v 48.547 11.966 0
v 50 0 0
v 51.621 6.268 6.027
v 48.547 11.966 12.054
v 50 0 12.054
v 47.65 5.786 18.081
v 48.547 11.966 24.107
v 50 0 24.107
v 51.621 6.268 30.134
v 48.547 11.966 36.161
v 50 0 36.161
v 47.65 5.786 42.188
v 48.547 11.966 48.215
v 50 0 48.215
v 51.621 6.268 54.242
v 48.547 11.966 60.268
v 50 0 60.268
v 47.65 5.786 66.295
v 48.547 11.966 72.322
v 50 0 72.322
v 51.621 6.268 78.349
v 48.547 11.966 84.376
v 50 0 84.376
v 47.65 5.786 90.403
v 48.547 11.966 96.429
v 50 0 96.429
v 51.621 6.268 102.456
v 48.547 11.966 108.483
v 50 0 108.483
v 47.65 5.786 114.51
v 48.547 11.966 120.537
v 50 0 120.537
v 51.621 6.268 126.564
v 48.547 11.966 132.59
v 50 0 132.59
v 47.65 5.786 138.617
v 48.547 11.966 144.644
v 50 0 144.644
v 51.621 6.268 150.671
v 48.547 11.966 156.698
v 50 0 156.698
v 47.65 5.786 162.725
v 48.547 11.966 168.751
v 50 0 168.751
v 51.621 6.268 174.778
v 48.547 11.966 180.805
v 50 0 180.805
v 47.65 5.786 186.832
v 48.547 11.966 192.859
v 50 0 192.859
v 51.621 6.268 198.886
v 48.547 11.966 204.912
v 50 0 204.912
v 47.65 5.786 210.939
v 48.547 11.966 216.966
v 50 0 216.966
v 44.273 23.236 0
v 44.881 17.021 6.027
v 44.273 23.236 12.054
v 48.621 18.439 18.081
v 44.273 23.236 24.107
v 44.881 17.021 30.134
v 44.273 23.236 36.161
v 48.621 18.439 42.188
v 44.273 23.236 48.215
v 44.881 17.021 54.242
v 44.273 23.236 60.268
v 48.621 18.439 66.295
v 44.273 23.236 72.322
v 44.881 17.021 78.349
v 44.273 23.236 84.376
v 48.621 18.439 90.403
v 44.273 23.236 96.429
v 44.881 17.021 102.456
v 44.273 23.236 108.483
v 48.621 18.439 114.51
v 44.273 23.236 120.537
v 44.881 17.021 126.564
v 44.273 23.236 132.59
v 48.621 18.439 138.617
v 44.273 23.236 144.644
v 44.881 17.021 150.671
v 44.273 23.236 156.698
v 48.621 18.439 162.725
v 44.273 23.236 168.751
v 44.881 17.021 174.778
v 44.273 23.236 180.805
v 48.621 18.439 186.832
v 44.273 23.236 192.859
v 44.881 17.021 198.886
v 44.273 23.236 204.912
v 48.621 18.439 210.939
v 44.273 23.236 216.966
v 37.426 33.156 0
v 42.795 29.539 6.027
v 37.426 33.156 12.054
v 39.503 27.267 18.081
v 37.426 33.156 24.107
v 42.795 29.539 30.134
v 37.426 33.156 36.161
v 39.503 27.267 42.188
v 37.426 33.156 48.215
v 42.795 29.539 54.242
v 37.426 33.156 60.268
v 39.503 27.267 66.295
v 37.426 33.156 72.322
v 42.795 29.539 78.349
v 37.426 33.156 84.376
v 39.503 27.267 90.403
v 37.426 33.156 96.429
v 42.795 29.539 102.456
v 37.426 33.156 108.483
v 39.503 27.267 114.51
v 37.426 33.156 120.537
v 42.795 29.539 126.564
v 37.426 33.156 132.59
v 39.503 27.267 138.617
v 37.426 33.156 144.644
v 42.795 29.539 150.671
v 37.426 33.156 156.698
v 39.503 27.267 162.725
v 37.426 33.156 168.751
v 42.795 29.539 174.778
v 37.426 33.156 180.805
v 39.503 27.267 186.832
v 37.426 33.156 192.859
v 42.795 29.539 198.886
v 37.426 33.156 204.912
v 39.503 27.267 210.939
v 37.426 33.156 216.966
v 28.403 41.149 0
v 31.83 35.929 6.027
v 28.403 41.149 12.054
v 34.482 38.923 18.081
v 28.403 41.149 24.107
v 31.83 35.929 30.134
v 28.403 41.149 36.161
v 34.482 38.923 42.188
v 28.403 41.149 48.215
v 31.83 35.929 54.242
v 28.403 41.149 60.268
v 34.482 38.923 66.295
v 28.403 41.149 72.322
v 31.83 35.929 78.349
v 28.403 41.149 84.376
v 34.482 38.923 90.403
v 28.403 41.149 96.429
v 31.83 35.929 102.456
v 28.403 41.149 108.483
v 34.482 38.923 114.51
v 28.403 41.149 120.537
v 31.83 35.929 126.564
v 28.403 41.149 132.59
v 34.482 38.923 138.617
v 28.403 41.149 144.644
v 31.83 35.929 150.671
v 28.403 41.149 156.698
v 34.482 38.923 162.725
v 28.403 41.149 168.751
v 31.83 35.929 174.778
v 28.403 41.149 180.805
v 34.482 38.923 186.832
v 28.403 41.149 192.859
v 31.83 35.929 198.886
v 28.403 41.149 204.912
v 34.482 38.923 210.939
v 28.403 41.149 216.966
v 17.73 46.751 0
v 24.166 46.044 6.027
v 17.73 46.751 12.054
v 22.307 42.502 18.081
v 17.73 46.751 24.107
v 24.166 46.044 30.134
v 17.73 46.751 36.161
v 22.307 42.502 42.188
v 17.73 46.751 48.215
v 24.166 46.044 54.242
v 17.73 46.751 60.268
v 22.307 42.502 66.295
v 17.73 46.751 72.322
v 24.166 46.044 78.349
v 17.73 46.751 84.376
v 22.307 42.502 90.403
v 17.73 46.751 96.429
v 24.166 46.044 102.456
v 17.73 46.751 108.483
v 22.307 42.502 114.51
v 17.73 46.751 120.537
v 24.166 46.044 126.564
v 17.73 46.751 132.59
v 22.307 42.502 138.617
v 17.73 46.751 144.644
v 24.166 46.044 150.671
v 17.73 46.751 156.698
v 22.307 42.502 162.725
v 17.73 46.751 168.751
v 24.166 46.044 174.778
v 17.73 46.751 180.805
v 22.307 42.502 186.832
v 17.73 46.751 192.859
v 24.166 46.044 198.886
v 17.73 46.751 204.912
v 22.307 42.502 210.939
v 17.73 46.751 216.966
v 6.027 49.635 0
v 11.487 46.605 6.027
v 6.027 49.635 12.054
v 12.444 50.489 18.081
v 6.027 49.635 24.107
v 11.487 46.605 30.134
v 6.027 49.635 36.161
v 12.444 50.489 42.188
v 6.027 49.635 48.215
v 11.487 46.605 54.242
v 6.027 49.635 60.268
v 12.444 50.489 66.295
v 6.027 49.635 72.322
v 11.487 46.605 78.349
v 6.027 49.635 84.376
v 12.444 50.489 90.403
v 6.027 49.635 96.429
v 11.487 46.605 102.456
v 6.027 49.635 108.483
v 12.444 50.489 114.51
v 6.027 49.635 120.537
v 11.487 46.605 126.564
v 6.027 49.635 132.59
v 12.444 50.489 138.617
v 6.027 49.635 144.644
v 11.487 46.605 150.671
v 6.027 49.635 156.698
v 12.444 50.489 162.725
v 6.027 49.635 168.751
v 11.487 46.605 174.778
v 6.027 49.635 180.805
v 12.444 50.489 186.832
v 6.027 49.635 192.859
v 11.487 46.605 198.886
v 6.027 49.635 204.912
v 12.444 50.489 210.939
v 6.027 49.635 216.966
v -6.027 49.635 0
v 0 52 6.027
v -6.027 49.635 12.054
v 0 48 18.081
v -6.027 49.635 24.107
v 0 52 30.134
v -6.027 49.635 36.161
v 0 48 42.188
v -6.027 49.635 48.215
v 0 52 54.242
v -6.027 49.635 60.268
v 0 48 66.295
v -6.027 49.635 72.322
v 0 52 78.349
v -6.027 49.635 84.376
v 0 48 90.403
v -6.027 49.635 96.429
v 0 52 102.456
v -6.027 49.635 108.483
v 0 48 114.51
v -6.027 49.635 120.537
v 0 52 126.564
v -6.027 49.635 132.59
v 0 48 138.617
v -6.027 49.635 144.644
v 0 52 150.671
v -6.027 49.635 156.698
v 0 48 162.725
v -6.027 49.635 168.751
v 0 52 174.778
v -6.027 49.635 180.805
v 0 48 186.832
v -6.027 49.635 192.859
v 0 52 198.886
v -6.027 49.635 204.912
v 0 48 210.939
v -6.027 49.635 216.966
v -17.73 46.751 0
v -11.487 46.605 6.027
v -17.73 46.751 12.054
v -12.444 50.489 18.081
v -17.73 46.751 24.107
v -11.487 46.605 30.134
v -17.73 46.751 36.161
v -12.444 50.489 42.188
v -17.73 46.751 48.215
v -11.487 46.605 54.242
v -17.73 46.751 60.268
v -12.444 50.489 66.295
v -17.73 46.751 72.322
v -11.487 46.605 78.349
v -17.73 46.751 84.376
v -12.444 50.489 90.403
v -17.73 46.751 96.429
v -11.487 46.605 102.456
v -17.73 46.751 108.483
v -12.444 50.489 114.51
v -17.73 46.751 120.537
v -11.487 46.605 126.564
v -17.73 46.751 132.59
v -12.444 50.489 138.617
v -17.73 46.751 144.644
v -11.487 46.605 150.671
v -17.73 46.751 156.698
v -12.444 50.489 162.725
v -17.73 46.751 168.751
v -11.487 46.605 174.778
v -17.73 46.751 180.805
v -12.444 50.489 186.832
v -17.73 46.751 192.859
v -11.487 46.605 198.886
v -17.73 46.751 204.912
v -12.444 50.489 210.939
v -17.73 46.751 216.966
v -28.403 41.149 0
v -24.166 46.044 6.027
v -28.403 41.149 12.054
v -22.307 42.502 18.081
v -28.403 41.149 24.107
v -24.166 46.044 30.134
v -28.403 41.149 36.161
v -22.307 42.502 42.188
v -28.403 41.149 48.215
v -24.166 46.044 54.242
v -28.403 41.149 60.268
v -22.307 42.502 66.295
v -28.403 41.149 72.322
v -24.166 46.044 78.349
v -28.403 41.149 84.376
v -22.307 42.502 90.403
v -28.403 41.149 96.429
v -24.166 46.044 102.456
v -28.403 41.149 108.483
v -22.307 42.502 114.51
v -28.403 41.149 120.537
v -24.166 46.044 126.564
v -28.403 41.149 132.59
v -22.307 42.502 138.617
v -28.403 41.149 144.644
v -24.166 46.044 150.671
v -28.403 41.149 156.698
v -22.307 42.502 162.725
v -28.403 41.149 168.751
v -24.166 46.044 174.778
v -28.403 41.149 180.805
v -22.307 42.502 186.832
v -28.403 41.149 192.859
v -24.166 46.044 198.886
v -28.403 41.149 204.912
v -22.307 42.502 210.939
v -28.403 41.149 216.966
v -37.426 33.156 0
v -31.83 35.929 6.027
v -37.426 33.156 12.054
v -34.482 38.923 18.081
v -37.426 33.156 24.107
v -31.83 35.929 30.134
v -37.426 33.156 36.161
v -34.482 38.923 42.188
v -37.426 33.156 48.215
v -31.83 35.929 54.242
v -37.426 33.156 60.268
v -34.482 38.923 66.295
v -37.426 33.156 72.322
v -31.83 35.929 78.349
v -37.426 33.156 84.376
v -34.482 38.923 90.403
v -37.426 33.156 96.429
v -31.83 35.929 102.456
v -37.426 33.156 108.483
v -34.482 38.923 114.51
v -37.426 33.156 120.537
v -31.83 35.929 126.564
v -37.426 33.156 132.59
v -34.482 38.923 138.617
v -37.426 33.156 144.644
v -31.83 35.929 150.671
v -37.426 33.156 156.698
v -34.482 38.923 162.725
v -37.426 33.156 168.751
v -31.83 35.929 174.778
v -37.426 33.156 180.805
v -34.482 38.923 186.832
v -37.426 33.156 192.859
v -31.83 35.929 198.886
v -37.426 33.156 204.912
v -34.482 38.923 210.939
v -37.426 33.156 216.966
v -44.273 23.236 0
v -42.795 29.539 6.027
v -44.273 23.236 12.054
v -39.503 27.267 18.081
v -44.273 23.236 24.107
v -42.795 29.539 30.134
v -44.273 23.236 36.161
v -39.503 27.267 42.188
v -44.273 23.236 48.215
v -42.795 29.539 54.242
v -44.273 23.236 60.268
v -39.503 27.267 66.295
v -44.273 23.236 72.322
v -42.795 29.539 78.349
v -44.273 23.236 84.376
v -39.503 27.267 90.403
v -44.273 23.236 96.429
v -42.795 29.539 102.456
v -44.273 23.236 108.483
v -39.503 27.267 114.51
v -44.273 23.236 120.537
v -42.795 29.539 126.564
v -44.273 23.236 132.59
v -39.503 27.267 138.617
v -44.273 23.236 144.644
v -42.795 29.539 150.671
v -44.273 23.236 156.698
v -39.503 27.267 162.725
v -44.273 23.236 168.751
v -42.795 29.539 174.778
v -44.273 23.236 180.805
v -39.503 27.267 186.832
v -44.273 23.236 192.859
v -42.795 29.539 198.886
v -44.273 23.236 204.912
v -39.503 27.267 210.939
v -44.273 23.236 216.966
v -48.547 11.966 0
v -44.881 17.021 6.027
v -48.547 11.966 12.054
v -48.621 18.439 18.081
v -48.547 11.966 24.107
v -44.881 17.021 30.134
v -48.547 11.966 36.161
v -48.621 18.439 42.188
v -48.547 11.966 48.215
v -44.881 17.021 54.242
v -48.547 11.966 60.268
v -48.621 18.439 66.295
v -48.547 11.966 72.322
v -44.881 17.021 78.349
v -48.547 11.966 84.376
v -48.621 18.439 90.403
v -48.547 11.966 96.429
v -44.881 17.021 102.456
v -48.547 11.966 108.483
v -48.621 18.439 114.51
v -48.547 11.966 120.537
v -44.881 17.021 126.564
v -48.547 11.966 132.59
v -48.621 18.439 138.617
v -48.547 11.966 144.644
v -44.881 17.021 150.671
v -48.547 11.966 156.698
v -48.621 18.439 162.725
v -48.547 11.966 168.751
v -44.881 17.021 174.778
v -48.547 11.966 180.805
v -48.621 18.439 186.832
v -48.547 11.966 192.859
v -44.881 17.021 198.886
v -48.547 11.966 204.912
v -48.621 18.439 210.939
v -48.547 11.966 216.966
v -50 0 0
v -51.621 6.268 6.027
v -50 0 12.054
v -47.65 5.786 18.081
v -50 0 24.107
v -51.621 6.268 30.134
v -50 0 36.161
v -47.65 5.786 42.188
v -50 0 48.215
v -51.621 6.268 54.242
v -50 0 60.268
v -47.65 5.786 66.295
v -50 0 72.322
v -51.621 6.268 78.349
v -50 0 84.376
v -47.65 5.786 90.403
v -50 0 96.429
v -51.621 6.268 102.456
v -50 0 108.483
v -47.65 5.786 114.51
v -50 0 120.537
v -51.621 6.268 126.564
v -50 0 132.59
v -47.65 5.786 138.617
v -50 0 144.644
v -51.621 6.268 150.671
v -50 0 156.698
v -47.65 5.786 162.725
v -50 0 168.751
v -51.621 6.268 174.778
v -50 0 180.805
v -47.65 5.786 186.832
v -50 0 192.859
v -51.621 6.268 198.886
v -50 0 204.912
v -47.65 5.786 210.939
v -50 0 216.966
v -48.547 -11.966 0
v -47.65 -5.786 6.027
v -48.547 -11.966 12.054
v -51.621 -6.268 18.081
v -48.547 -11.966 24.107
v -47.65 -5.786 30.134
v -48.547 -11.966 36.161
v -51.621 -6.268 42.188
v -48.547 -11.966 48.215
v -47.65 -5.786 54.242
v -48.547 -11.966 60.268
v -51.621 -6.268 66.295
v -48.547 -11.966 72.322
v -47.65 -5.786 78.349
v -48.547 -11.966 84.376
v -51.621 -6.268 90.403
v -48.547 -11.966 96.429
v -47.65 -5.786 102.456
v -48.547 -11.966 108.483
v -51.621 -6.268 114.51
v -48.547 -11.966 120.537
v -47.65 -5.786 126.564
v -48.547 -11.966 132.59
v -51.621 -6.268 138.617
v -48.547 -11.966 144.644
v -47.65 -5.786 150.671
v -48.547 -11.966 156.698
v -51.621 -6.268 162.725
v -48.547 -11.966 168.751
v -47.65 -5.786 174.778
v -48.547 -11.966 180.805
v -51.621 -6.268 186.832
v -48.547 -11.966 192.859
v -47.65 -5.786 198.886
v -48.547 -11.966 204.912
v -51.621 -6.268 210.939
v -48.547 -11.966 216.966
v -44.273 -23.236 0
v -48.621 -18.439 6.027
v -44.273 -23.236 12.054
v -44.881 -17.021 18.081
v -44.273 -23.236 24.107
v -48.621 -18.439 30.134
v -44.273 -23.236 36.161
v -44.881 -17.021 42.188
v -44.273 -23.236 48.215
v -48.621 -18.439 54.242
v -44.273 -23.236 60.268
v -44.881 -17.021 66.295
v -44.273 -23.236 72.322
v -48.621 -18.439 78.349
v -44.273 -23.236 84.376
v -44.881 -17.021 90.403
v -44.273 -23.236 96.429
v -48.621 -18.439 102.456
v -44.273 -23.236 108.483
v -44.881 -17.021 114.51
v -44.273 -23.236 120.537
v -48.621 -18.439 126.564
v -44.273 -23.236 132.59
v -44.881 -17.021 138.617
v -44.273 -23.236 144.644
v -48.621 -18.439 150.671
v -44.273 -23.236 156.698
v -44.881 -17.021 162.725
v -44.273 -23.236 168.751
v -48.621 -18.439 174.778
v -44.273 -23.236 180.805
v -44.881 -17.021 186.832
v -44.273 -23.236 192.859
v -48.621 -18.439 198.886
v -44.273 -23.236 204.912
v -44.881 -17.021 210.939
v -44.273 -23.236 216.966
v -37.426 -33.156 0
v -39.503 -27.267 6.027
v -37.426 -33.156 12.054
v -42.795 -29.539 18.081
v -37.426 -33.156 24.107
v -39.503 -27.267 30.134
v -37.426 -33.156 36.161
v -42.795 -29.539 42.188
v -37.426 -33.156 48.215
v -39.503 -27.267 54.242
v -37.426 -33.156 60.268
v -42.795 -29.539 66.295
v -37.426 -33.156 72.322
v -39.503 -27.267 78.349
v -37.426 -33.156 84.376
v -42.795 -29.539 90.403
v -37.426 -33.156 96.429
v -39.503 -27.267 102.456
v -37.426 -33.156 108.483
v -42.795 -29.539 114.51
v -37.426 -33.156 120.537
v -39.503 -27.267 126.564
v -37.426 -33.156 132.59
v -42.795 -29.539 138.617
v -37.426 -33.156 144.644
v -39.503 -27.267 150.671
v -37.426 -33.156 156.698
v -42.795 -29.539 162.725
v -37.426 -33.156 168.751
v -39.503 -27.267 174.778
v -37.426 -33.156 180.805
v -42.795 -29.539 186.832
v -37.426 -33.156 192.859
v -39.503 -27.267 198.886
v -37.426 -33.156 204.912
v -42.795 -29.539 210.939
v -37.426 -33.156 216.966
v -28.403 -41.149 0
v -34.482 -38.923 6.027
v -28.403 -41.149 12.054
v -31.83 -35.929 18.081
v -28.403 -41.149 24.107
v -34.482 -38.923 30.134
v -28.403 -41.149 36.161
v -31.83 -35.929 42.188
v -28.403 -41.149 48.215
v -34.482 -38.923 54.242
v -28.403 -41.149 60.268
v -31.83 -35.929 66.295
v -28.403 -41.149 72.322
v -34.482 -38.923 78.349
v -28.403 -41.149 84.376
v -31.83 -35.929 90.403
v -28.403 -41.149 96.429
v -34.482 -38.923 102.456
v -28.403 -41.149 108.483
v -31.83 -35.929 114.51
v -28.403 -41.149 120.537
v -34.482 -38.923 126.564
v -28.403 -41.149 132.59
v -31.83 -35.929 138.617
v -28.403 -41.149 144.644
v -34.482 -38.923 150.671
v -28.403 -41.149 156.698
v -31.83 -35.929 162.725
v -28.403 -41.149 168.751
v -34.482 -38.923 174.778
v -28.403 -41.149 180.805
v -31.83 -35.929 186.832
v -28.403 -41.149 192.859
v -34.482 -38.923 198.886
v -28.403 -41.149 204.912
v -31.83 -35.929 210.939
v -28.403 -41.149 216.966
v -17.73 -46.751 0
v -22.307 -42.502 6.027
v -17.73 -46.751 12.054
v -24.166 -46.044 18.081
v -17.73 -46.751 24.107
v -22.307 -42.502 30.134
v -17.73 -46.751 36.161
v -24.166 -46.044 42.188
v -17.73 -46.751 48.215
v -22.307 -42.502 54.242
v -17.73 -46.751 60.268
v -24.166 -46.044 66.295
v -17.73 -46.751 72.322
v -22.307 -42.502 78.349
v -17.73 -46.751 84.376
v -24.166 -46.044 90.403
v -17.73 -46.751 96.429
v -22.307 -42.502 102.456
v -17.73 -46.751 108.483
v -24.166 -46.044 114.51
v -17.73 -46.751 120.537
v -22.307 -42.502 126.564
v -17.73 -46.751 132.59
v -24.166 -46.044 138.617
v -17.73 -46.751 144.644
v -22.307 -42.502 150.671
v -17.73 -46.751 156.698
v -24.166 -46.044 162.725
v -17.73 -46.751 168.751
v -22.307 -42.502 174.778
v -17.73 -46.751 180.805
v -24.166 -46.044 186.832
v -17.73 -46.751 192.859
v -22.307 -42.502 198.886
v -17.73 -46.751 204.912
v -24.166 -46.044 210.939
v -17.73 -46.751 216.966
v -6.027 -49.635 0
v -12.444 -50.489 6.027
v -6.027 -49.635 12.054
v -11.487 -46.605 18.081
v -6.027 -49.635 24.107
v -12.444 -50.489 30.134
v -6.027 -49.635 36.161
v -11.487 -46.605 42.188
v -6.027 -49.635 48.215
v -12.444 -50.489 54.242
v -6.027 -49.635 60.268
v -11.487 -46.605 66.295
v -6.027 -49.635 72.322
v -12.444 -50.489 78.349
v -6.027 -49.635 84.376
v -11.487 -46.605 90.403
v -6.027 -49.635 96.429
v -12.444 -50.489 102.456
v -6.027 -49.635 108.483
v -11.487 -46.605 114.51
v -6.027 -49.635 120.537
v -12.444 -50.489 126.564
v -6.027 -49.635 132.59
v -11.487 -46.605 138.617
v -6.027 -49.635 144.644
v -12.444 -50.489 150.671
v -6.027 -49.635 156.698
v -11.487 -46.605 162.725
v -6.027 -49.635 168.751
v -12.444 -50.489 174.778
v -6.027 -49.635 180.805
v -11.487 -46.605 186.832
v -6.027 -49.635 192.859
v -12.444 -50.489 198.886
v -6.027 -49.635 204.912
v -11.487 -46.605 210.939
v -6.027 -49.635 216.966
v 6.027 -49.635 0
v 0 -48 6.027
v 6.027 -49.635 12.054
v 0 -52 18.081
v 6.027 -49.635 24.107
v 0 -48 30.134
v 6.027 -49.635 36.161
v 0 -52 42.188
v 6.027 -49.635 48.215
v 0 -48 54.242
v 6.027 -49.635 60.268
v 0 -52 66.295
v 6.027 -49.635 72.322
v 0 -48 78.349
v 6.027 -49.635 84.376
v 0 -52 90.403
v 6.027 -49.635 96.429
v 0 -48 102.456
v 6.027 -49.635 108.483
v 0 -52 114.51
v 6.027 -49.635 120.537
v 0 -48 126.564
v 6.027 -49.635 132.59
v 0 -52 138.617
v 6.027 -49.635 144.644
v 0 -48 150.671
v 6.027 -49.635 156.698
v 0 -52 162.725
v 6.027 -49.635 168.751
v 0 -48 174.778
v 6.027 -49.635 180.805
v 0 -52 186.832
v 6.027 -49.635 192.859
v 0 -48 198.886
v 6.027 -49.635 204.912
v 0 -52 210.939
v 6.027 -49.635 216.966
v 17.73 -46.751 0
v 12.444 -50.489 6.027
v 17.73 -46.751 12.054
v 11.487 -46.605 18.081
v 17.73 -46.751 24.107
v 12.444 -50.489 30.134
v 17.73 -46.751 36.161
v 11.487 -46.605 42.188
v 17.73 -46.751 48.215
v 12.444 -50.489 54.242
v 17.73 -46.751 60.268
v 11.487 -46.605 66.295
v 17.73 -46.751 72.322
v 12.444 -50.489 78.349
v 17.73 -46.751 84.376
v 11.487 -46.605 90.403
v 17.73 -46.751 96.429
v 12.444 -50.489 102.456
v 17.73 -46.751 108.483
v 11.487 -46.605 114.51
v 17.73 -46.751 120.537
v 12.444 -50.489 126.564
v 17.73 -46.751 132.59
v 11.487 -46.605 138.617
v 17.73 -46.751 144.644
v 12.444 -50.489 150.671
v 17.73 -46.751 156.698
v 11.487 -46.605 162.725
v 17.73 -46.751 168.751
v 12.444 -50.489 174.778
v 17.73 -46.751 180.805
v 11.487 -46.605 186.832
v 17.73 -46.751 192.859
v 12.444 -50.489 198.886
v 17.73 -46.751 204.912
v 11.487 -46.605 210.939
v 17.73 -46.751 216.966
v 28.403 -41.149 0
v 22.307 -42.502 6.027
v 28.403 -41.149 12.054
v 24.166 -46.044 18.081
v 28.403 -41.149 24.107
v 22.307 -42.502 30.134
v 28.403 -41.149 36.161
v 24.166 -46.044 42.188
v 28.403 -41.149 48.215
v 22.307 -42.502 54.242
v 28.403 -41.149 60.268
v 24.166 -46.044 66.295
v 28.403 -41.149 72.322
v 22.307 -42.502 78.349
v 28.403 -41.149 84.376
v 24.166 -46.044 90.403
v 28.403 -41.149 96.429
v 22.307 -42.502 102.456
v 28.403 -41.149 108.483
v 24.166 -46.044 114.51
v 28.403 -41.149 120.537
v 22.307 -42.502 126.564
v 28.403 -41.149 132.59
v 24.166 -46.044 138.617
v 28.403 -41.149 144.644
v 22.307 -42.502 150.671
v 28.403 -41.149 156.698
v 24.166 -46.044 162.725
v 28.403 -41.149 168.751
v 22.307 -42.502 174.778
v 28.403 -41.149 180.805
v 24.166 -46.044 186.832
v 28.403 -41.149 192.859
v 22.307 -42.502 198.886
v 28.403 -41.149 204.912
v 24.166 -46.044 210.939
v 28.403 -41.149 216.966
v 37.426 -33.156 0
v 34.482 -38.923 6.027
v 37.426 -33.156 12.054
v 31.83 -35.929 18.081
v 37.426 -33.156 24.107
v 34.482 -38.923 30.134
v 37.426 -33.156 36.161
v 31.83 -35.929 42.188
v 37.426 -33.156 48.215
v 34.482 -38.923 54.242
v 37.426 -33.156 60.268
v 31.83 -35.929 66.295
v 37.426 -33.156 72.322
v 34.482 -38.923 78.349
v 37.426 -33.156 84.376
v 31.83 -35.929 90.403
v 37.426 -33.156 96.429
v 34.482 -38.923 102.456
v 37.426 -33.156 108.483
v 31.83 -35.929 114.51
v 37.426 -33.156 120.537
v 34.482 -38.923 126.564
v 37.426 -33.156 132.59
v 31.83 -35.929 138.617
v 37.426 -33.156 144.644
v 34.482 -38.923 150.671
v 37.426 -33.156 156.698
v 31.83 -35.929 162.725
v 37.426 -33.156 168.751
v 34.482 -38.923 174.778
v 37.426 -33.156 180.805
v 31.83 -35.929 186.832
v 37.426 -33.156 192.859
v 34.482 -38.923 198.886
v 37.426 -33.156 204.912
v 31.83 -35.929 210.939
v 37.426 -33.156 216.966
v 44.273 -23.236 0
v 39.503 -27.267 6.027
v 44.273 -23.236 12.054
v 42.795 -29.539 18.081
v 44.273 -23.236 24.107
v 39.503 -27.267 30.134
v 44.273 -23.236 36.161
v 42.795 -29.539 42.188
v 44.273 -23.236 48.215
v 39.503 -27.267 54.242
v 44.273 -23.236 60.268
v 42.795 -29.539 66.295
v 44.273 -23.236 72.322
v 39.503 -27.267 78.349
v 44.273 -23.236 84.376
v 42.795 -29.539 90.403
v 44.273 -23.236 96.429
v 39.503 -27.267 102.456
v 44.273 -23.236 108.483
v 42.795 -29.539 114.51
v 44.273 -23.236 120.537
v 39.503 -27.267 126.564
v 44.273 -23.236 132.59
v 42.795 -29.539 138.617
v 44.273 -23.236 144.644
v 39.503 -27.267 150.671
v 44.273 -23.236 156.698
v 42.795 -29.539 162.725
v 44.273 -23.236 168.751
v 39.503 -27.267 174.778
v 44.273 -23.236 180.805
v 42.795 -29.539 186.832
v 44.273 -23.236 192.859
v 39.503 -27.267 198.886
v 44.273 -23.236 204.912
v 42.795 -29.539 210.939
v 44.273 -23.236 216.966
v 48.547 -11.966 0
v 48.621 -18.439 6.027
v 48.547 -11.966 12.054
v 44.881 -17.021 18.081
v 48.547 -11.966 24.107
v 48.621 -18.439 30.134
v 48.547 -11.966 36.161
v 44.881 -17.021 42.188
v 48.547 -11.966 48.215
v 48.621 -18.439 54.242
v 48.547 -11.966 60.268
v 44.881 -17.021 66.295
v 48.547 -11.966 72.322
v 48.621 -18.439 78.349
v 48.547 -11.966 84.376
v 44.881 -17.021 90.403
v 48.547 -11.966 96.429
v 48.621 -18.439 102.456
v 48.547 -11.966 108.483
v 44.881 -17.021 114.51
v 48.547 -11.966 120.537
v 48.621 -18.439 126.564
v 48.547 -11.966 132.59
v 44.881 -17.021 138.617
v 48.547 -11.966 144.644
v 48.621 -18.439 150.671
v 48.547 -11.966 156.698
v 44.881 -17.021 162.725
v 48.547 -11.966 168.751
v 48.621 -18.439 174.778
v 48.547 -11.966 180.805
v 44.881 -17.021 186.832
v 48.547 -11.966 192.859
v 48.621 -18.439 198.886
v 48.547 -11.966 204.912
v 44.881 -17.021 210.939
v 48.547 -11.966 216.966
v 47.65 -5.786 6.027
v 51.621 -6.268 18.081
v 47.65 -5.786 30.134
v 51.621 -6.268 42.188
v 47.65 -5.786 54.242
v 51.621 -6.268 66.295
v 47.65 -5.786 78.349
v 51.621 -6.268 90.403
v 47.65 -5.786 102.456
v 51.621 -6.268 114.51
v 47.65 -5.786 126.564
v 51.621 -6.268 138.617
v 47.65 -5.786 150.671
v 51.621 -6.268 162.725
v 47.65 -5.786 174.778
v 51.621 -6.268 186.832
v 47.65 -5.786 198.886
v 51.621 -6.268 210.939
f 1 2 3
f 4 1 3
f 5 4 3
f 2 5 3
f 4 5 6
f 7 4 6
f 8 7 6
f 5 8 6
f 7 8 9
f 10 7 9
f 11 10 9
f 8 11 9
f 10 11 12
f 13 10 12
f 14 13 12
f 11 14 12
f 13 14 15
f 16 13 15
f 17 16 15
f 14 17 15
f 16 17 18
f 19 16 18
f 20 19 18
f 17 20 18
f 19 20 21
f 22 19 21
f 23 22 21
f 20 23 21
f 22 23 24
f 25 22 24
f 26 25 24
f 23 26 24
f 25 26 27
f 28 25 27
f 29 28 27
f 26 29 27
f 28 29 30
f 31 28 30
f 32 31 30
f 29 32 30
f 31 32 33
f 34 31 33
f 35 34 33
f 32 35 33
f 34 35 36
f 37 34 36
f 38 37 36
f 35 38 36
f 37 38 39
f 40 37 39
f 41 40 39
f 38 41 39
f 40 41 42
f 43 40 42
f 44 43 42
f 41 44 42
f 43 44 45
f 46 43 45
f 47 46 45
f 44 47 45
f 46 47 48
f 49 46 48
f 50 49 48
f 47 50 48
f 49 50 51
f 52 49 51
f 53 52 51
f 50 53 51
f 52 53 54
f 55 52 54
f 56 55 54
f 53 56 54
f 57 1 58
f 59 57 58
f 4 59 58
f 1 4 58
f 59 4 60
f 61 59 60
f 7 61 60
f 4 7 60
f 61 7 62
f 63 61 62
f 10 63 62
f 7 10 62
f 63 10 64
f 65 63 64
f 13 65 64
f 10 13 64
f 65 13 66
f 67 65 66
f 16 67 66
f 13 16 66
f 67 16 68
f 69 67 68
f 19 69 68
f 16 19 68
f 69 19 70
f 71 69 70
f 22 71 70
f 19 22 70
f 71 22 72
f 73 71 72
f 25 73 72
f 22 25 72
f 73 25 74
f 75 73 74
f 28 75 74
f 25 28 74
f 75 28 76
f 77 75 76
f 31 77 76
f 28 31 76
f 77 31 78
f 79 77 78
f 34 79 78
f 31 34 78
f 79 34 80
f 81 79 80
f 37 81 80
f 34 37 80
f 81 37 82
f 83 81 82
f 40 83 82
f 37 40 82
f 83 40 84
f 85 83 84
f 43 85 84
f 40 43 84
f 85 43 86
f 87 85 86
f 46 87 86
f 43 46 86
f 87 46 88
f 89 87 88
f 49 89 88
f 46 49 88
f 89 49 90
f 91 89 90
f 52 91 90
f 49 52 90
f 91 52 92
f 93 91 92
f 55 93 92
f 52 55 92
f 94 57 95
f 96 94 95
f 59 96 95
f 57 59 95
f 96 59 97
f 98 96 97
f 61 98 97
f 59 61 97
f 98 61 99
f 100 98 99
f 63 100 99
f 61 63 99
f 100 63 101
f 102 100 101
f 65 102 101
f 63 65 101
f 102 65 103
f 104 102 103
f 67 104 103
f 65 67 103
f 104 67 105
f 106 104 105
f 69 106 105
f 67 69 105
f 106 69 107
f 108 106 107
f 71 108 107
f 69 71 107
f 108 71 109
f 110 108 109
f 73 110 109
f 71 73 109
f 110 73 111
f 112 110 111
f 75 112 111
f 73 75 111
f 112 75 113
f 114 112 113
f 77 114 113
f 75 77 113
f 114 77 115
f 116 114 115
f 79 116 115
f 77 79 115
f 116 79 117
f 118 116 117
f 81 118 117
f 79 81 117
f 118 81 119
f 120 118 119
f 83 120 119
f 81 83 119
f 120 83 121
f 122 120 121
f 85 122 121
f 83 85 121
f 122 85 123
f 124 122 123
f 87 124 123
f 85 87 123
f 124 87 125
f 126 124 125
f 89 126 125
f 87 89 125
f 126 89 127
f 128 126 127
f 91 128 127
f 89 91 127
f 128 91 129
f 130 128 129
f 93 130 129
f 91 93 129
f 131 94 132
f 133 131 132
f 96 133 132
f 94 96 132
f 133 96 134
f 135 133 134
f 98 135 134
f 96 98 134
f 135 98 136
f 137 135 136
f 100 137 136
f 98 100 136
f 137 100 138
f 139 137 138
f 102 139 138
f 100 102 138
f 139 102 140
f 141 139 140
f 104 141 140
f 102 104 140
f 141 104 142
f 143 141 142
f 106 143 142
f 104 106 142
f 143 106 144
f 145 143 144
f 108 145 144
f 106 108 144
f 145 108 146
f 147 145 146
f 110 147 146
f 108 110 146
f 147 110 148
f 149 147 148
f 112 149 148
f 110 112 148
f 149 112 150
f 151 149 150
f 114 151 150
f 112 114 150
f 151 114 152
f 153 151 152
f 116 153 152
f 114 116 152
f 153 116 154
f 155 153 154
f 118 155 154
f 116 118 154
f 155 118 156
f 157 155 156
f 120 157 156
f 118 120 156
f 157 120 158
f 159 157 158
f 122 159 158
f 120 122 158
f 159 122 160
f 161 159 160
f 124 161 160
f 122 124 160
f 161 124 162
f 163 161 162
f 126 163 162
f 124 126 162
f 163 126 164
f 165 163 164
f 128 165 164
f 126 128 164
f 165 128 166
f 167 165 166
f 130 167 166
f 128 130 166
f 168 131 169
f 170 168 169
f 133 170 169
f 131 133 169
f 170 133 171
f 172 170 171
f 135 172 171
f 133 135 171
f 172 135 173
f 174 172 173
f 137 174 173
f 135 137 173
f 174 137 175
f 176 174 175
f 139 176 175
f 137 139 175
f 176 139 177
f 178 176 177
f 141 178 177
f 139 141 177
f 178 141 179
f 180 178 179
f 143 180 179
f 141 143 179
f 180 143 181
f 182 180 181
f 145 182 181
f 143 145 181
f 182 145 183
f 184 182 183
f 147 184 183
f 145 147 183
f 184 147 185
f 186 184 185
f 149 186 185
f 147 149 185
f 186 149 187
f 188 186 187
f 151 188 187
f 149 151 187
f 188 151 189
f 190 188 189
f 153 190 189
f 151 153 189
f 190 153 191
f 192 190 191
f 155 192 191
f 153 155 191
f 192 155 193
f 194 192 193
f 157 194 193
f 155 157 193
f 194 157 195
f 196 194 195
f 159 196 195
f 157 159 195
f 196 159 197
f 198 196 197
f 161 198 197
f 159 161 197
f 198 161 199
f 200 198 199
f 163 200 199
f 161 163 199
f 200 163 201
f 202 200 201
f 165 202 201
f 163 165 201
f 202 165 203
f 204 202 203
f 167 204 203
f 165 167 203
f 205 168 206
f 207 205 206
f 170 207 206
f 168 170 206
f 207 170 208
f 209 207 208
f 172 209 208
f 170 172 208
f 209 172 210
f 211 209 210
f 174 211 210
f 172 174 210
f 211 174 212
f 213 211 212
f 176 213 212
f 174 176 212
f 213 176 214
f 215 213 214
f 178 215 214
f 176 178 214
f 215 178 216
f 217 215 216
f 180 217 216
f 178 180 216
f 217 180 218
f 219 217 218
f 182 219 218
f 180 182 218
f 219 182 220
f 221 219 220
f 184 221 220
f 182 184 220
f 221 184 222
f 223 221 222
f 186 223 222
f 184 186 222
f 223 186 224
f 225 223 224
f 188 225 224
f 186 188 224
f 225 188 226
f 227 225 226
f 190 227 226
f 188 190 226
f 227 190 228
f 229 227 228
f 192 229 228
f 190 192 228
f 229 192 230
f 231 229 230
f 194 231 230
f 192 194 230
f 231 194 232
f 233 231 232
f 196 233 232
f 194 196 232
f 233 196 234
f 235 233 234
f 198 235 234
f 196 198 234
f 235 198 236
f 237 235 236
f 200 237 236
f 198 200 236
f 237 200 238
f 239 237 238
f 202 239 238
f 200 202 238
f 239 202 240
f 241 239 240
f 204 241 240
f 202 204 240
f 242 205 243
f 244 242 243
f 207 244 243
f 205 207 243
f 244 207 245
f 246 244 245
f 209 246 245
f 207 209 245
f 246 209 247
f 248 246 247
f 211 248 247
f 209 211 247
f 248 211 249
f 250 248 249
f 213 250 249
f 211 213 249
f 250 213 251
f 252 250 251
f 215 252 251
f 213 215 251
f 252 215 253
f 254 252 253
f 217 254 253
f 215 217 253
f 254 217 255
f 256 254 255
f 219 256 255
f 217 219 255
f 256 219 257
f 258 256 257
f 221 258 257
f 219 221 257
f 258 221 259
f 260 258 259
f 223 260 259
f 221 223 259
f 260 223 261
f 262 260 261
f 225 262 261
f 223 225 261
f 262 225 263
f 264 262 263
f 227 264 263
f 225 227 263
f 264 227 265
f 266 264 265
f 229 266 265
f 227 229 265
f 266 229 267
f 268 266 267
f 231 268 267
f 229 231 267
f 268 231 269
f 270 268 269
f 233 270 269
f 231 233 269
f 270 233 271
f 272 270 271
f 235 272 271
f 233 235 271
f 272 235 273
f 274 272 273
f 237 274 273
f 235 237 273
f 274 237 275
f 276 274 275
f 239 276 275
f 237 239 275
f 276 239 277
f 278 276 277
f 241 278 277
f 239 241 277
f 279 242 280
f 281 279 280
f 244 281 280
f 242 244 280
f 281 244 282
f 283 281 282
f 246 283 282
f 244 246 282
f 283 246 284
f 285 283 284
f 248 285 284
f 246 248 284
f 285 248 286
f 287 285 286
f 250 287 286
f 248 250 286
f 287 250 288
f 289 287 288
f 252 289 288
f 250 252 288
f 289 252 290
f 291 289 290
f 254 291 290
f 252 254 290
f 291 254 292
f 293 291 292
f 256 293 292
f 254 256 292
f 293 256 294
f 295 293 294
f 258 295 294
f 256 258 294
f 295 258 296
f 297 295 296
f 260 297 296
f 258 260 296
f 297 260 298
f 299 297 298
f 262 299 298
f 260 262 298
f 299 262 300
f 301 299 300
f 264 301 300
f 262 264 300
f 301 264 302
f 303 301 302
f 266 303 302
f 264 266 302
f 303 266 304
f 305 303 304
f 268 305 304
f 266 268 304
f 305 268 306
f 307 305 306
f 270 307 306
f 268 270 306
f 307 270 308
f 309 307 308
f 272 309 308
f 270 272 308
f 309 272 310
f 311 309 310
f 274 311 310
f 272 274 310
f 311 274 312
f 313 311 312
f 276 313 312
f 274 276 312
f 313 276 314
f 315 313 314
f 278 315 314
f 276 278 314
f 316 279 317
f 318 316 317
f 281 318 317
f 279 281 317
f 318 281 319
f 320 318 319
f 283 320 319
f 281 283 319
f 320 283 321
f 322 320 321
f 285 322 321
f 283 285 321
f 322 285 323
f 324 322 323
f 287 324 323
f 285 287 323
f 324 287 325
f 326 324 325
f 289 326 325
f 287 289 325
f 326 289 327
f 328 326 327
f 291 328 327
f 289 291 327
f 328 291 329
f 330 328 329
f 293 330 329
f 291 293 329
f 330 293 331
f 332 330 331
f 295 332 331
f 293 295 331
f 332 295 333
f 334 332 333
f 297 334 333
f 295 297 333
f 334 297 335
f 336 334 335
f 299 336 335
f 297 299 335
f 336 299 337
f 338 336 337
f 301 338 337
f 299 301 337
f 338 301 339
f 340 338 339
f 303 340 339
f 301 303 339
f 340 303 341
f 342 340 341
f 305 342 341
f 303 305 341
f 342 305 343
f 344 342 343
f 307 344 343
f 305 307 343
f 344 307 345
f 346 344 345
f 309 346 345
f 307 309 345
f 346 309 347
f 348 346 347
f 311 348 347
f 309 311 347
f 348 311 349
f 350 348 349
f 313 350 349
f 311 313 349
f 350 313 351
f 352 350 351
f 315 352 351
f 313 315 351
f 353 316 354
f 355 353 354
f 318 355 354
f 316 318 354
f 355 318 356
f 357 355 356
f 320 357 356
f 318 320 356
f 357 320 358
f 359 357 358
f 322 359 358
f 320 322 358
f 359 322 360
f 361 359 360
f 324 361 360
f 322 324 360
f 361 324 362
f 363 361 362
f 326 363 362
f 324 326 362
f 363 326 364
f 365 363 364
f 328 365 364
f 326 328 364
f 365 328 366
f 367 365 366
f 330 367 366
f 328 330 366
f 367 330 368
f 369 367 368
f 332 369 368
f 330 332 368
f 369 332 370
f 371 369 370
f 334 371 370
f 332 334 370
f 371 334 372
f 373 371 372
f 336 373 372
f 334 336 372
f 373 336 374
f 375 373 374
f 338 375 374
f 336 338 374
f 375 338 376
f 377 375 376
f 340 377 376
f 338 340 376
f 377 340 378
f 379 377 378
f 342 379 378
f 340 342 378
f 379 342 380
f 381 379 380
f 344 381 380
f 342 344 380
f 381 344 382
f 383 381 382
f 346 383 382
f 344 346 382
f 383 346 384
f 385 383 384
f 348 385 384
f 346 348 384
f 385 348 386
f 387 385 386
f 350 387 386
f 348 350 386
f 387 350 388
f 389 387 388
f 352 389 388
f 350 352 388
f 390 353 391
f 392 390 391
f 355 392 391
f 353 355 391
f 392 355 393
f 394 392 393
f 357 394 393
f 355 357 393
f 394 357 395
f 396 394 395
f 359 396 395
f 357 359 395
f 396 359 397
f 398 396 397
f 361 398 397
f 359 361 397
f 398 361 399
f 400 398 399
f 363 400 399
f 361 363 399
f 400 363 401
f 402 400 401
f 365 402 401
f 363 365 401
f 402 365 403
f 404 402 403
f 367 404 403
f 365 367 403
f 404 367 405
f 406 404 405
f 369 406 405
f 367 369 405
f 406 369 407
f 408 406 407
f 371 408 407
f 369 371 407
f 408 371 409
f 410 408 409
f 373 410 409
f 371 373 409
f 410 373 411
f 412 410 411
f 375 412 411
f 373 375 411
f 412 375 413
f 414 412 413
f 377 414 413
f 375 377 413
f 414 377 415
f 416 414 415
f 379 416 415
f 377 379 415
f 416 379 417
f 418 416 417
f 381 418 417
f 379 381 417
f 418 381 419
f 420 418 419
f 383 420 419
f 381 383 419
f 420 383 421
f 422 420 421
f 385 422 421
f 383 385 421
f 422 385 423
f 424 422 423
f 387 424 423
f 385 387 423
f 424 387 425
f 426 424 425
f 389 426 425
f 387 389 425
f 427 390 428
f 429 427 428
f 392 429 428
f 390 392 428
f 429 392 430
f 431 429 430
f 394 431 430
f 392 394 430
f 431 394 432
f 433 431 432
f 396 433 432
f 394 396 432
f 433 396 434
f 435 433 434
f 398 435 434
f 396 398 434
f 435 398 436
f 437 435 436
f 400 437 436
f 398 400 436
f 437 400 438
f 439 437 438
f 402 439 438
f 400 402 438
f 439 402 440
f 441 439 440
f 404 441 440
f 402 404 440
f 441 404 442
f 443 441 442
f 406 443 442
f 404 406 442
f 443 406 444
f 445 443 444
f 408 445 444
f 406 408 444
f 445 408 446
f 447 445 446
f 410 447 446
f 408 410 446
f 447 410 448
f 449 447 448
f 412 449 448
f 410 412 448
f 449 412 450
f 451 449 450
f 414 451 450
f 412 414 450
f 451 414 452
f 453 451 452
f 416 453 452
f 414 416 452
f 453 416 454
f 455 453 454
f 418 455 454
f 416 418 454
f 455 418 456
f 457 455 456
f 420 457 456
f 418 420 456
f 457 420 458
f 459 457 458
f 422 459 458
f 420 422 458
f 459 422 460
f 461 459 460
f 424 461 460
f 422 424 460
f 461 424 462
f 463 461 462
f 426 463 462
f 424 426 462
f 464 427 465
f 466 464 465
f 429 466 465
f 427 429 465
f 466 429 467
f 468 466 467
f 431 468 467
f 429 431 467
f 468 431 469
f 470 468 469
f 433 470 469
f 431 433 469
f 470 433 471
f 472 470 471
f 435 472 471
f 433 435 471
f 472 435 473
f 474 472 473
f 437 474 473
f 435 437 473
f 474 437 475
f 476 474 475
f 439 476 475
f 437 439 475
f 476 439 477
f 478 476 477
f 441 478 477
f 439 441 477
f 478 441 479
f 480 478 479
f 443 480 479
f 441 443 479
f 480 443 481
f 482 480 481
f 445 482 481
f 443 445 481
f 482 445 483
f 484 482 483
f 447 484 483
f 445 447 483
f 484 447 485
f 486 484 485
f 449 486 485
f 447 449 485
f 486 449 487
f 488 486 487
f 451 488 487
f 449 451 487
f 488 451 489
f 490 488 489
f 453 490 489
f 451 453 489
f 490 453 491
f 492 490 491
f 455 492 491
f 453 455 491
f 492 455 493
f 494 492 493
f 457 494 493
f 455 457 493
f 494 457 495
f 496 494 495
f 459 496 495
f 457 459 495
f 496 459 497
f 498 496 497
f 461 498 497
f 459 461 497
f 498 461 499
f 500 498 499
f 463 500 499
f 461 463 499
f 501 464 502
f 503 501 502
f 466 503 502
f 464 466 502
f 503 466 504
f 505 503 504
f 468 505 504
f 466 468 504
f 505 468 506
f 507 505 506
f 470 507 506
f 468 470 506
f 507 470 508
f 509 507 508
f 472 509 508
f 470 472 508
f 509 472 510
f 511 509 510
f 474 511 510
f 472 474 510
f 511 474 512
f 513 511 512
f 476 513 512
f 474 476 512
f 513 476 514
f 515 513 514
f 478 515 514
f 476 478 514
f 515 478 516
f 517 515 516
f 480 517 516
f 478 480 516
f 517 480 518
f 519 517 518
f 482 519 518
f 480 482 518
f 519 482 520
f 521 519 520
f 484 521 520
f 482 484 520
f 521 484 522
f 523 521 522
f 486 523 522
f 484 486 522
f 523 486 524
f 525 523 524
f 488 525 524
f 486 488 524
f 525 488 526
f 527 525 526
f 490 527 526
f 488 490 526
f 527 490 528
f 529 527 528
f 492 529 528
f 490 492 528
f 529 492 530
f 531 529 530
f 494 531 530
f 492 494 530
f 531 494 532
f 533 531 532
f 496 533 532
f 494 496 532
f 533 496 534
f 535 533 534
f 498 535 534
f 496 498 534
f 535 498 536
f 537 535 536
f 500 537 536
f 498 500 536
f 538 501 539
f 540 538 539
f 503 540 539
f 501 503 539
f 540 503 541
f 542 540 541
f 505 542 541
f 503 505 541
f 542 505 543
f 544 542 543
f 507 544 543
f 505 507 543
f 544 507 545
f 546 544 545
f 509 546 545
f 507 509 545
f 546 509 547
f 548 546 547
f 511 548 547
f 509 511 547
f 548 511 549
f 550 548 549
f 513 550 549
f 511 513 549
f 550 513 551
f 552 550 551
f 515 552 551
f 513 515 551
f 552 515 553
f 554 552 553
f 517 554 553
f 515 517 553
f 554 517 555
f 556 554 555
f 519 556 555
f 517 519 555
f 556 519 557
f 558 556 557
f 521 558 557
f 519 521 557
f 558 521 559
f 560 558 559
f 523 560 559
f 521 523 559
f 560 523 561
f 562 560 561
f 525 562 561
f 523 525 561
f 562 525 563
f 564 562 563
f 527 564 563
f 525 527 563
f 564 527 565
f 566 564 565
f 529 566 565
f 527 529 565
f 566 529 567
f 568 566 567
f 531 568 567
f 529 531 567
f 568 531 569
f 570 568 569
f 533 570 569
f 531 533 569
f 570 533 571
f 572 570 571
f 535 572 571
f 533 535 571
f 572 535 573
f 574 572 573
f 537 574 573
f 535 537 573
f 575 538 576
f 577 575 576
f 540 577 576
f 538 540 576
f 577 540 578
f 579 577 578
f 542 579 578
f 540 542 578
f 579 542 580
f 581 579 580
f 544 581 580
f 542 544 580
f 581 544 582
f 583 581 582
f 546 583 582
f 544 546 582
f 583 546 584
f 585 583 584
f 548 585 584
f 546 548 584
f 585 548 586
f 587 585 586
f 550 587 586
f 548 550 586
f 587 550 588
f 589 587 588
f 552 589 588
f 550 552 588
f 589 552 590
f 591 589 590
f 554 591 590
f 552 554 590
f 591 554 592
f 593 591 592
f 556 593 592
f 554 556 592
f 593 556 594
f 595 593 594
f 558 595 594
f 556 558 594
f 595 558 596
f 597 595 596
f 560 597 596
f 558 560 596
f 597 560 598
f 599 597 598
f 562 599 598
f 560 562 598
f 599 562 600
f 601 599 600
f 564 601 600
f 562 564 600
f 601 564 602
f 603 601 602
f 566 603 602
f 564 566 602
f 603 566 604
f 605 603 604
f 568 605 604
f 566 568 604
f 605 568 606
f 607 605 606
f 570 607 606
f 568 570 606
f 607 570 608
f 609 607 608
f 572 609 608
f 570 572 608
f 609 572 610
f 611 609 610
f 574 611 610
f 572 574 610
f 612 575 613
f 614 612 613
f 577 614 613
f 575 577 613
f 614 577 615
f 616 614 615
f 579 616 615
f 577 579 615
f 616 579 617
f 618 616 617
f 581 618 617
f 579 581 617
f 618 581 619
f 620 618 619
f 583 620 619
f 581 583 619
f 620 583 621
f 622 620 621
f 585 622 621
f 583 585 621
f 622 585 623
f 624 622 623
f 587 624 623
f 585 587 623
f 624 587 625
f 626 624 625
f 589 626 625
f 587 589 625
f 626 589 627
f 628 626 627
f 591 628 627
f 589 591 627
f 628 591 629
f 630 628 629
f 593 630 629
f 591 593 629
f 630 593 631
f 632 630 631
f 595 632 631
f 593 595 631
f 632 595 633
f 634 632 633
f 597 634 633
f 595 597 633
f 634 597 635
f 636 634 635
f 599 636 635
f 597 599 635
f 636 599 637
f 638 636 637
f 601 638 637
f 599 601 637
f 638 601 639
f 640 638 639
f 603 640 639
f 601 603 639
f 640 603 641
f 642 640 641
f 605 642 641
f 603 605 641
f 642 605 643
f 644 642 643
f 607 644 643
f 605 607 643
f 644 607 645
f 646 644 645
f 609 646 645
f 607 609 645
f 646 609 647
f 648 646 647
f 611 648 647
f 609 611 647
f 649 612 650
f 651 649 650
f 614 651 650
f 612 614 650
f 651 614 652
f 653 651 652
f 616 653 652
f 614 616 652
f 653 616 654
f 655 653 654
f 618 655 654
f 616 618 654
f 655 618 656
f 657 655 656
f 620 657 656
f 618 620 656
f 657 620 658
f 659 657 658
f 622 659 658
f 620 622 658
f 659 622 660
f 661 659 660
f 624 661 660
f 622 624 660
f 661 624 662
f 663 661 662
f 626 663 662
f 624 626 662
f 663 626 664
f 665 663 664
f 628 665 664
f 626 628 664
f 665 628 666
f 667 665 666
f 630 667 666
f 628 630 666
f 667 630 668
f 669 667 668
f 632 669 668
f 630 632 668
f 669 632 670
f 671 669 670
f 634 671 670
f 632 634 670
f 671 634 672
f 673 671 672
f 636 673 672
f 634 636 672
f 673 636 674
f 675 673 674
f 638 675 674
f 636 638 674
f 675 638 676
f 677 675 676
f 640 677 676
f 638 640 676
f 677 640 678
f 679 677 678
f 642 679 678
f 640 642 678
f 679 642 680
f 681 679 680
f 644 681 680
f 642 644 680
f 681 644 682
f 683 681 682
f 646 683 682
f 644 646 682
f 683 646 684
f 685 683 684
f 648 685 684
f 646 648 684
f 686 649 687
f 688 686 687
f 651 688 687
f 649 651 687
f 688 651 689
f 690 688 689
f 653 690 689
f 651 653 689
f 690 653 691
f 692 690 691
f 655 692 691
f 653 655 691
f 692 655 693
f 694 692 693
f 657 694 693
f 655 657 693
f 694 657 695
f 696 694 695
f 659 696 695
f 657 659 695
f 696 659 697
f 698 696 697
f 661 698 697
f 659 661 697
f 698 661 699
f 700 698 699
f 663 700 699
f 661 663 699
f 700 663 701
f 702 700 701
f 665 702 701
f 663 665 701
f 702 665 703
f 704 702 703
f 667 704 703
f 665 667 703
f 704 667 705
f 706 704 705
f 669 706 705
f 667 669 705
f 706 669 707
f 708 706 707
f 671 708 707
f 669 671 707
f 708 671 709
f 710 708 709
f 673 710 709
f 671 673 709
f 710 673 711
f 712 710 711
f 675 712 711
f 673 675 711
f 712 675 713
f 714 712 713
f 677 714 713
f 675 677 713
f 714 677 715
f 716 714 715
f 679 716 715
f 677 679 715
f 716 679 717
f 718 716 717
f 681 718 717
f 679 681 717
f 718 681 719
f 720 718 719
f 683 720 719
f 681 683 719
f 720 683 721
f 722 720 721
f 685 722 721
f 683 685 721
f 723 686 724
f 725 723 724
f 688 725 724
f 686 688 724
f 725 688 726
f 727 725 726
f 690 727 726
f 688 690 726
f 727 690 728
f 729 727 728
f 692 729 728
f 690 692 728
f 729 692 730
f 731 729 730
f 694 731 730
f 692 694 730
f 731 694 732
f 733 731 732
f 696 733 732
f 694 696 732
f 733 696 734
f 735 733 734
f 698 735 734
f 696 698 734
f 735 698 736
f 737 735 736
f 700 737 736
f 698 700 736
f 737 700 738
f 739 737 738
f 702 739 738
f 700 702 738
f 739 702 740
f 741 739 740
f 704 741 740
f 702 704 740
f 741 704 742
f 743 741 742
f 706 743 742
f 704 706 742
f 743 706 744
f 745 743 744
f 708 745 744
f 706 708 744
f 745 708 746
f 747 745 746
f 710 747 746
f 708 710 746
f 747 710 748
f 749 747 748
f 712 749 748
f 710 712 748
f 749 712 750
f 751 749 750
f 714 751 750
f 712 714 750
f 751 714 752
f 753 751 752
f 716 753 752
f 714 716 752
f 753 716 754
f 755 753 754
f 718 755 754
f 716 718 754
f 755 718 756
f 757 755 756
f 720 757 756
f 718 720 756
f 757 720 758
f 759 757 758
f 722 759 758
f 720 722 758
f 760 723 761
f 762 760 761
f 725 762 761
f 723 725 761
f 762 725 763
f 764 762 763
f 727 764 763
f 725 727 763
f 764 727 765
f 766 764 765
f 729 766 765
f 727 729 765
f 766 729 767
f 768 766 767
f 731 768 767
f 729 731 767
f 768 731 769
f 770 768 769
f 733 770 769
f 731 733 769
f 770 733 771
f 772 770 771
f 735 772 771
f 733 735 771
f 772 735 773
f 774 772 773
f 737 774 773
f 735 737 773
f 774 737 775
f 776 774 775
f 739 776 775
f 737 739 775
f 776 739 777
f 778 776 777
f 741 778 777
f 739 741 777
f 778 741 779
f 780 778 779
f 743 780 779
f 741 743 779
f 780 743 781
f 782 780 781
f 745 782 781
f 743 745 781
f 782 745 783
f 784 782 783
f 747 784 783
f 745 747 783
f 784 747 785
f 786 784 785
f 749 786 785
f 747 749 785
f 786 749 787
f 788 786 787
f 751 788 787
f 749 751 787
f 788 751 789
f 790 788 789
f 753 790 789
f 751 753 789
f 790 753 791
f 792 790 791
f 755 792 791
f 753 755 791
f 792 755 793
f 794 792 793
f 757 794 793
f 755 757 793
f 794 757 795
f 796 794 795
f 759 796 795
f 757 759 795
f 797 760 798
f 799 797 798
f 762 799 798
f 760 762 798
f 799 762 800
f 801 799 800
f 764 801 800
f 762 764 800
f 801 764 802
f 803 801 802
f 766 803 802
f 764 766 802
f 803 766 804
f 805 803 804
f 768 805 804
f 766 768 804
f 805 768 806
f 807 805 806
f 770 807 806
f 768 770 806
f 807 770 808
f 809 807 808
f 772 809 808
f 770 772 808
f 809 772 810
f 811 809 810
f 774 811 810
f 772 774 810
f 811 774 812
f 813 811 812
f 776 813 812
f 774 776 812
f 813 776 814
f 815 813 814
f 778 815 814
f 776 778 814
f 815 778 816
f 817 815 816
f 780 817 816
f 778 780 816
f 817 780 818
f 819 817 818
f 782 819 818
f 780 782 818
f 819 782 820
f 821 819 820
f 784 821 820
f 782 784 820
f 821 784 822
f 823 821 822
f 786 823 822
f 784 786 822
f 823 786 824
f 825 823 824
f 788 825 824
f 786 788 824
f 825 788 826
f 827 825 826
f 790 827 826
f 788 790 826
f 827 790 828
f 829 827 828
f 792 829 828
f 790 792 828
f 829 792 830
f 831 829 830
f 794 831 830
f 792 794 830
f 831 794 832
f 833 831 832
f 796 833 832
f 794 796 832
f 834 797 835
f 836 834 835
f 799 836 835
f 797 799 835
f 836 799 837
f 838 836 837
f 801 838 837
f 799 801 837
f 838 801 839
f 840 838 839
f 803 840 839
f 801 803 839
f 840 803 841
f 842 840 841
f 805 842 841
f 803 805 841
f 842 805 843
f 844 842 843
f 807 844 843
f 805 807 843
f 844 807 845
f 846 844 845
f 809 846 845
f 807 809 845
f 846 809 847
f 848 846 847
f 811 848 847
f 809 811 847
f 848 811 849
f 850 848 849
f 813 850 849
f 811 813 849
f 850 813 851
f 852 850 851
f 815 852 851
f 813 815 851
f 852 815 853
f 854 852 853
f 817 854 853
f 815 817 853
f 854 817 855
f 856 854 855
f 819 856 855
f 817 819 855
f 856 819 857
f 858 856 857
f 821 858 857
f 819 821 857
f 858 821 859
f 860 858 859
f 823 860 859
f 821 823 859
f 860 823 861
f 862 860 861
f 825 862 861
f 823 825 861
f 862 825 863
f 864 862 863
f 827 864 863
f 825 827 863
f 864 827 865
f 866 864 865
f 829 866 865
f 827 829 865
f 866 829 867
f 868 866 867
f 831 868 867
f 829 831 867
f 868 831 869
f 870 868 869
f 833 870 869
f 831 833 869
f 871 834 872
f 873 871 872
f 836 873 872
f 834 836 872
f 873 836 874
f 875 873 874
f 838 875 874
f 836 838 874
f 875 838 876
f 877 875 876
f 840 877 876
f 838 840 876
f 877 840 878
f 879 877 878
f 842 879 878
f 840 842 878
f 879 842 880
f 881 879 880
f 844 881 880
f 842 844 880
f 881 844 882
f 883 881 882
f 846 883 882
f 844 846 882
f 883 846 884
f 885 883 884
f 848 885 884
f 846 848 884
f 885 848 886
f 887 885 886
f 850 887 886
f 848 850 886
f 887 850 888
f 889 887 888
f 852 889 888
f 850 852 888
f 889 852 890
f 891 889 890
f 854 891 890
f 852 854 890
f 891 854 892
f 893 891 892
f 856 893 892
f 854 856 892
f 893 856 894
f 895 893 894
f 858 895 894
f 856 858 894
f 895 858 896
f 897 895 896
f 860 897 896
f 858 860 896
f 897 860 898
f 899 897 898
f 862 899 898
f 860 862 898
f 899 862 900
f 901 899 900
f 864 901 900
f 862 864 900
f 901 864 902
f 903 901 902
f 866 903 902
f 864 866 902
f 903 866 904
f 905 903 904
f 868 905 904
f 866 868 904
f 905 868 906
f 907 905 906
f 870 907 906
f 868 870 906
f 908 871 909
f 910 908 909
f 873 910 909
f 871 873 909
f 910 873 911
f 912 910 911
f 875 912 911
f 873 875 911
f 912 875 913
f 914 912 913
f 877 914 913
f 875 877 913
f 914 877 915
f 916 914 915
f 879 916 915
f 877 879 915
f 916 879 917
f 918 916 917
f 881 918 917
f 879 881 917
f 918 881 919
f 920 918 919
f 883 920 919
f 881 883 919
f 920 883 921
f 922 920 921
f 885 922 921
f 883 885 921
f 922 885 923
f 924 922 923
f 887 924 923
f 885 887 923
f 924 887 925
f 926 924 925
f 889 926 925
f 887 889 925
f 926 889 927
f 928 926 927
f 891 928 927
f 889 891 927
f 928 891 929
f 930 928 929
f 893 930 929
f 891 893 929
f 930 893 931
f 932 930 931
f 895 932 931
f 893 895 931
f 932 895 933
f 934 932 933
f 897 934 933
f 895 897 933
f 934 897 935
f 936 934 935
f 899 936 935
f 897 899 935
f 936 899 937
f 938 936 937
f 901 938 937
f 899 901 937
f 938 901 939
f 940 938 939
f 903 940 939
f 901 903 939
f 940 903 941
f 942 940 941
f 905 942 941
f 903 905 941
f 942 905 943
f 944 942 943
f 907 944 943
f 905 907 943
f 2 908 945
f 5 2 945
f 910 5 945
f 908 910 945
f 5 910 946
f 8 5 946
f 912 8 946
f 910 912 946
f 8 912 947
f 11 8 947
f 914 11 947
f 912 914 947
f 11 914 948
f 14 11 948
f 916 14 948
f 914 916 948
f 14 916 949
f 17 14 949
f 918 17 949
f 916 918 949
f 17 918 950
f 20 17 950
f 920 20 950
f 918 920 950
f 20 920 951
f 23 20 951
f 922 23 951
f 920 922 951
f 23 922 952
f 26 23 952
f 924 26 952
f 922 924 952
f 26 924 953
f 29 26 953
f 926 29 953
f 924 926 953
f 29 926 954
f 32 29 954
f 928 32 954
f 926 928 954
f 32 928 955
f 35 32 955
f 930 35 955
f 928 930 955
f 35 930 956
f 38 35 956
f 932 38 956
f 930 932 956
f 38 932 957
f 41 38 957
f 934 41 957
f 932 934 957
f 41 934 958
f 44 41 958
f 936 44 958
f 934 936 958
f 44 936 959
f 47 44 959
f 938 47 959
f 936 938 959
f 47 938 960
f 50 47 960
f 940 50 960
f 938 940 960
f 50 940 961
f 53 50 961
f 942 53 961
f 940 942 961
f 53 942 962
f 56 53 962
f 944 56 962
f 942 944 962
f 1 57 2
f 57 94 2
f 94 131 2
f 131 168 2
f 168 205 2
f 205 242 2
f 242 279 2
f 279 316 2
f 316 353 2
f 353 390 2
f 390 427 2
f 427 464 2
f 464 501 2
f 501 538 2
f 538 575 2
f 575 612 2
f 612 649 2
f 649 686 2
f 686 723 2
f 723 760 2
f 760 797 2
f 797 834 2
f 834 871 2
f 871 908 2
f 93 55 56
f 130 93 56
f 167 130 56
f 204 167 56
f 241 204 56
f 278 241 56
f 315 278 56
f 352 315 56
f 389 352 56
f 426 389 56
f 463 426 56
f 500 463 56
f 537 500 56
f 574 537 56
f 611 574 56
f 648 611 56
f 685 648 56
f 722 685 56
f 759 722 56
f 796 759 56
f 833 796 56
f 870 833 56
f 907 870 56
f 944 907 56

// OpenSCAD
// =============================================================
// Knurled vase - parametric OpenSCAD version of the Fusion 360 model
//
// Pattern: a checkerboard of alternating outset / inset 4-sided
// pyramids ("diamond knurl") wrapped around a cylinder.
//
// Reverse-engineered from the original .step:
//   radius        = 30 mm
//   sides         = 27 pairs  (54 pyramids, one every 6.67 deg)
//   one cell      = 3.489 mm tall (square cells)
//   knurl depth   = ~0.95 mm radial
//
// New compared to Fusion: `rows` controls vertical repetition.
// =============================================================

/* [Vase shape] */

// Base cylinder radius (mm)
radius = 50;            // [10:1:100]

// Pyramid pairs around the circumference (doubled internally so the
// alternating in/out checkerboard always closes cleanly at the seam)
sides = 13;             // [4:1:40]

// Pyramid rows stacked vertically
rows = 18;              // [1:1:80]

/* [Knurl pattern] */

// Radial outset / inset of each pyramid (mm)
knurl_depth = 2;        // [0:0.05:5]

// Cell height / circumferential width; 1.0 = square cells
cell_aspect = 1;      // [0.25:0.05:3]

/* [Floor] */

// Solid floor thickness (mm); 0 = open bottom. The bottom outer edge is
// rounded with a corner radius equal to this height (a full quarter-round).
floor_thick = 0;        // [0:0.5:10]

/* [Hidden] */

$fn = 64;               // only affects the floor cylinder

// -------------------- Derived --------------------
_sides = 2 * sides;     // doubled so the checkerboard parity always closes
cell_w = 2 * radius * sin(180 / _sides);
cell_h = cell_w * cell_aspect;

echo(str("Vase height = ", rows * cell_h, " mm / ",
         round(rows * cell_h / 25.4 * 100) / 100, " in",
         "  (cell = ", cell_w, " x ", cell_h, " mm)"));

// -------------------- Geometry --------------------
function corner_pt(i, j) = [
    radius * cos(360 * i / _sides),
    radius * sin(360 * i / _sides),
    j * cell_h
];

function apex_pt(i, j) =
    let(
        ang  = 360 * (i + 0.5) / _sides,
        sgn  = (((i + j) % 2) == 0) ? +1 : -1,   // checkerboard
        r    = radius + sgn * knurl_depth
    )
    [r * cos(ang), r * sin(ang), (j + 0.5) * cell_h];

// Index helpers (i wraps around the cylinder)
function ci(i, j) = (i % _sides) * (rows + 1) + j;
function ai(i, j) = _sides * (rows + 1) + (i % _sides) * rows + j;

corner_points = [
    for (i = [0 : _sides - 1], j = [0 : rows])
        corner_pt(i, j)
];

apex_points = [
    for (i = [0 : _sides - 1], j = [0 : rows - 1])
        apex_pt(i, j)
];

all_points = concat(corner_points, apex_points);

// Each cell = 4 triangles from its apex out to the 4 base corners.
// Same winding for outset and inset; the apex's radial sign already flips
// the geometry, and using a consistent vertex order keeps every shared
// edge traversed in opposite directions (manifold requirement).
cell_faces = [
    for (i = [0 : _sides - 1], j = [0 : rows - 1]) each
        let(
            bl = ci(i,     j    ),
            br = ci(i + 1, j    ),
            tr = ci(i + 1, j + 1),
            tl = ci(i,     j + 1),
            ap = ai(i,     j    )
        )
        [[ap, bl, br], [ap, br, tr], [ap, tr, tl], [ap, tl, bl]]
];

// Close the bottom and top of the knurled shell with N-gon fans.
// Bottom face normal must point -Z (outward); top must point +Z.
bottom_faces = [
    for (i = [1 : _sides - 2])
        [ci(0, 0), ci(i + 1, 0), ci(i, 0)]
];

top_faces = [
    for (i = [1 : _sides - 2])
        [ci(0, rows), ci(i, rows), ci(i + 1, rows)]
];

all_faces = concat(cell_faces, bottom_faces, top_faces);

// -------------------- Render --------------------
// Floor disk whose bottom outer edge is rounded with a corner radius equal
// to the floor height, leaving the top a flat _sides-gon flush with the
// shell base. $fn = _sides keeps the side facets aligned to the knurled wall;
// the quarter-round profile gets its own (smooth) resolution from `arc_steps`.
module rounded_floor() {
    r = floor_thick;
    arc_steps = 24;
    profile = concat(
        [[0, 0]],
        [for (k = [0 : arc_steps])
            let(a = -90 * k / arc_steps)
            [radius - r + r * cos(a), r * sin(a)]],
        [[0, -floor_thick]]
    );
    rotate_extrude($fn = _sides) polygon(profile);
}

module knurled_vase() {
    union() {
        if (floor_thick > 0)
            rounded_floor();
        polyhedron(points = all_points, faces = all_faces, convexity = 10);
    }
}

knurled_vase();
